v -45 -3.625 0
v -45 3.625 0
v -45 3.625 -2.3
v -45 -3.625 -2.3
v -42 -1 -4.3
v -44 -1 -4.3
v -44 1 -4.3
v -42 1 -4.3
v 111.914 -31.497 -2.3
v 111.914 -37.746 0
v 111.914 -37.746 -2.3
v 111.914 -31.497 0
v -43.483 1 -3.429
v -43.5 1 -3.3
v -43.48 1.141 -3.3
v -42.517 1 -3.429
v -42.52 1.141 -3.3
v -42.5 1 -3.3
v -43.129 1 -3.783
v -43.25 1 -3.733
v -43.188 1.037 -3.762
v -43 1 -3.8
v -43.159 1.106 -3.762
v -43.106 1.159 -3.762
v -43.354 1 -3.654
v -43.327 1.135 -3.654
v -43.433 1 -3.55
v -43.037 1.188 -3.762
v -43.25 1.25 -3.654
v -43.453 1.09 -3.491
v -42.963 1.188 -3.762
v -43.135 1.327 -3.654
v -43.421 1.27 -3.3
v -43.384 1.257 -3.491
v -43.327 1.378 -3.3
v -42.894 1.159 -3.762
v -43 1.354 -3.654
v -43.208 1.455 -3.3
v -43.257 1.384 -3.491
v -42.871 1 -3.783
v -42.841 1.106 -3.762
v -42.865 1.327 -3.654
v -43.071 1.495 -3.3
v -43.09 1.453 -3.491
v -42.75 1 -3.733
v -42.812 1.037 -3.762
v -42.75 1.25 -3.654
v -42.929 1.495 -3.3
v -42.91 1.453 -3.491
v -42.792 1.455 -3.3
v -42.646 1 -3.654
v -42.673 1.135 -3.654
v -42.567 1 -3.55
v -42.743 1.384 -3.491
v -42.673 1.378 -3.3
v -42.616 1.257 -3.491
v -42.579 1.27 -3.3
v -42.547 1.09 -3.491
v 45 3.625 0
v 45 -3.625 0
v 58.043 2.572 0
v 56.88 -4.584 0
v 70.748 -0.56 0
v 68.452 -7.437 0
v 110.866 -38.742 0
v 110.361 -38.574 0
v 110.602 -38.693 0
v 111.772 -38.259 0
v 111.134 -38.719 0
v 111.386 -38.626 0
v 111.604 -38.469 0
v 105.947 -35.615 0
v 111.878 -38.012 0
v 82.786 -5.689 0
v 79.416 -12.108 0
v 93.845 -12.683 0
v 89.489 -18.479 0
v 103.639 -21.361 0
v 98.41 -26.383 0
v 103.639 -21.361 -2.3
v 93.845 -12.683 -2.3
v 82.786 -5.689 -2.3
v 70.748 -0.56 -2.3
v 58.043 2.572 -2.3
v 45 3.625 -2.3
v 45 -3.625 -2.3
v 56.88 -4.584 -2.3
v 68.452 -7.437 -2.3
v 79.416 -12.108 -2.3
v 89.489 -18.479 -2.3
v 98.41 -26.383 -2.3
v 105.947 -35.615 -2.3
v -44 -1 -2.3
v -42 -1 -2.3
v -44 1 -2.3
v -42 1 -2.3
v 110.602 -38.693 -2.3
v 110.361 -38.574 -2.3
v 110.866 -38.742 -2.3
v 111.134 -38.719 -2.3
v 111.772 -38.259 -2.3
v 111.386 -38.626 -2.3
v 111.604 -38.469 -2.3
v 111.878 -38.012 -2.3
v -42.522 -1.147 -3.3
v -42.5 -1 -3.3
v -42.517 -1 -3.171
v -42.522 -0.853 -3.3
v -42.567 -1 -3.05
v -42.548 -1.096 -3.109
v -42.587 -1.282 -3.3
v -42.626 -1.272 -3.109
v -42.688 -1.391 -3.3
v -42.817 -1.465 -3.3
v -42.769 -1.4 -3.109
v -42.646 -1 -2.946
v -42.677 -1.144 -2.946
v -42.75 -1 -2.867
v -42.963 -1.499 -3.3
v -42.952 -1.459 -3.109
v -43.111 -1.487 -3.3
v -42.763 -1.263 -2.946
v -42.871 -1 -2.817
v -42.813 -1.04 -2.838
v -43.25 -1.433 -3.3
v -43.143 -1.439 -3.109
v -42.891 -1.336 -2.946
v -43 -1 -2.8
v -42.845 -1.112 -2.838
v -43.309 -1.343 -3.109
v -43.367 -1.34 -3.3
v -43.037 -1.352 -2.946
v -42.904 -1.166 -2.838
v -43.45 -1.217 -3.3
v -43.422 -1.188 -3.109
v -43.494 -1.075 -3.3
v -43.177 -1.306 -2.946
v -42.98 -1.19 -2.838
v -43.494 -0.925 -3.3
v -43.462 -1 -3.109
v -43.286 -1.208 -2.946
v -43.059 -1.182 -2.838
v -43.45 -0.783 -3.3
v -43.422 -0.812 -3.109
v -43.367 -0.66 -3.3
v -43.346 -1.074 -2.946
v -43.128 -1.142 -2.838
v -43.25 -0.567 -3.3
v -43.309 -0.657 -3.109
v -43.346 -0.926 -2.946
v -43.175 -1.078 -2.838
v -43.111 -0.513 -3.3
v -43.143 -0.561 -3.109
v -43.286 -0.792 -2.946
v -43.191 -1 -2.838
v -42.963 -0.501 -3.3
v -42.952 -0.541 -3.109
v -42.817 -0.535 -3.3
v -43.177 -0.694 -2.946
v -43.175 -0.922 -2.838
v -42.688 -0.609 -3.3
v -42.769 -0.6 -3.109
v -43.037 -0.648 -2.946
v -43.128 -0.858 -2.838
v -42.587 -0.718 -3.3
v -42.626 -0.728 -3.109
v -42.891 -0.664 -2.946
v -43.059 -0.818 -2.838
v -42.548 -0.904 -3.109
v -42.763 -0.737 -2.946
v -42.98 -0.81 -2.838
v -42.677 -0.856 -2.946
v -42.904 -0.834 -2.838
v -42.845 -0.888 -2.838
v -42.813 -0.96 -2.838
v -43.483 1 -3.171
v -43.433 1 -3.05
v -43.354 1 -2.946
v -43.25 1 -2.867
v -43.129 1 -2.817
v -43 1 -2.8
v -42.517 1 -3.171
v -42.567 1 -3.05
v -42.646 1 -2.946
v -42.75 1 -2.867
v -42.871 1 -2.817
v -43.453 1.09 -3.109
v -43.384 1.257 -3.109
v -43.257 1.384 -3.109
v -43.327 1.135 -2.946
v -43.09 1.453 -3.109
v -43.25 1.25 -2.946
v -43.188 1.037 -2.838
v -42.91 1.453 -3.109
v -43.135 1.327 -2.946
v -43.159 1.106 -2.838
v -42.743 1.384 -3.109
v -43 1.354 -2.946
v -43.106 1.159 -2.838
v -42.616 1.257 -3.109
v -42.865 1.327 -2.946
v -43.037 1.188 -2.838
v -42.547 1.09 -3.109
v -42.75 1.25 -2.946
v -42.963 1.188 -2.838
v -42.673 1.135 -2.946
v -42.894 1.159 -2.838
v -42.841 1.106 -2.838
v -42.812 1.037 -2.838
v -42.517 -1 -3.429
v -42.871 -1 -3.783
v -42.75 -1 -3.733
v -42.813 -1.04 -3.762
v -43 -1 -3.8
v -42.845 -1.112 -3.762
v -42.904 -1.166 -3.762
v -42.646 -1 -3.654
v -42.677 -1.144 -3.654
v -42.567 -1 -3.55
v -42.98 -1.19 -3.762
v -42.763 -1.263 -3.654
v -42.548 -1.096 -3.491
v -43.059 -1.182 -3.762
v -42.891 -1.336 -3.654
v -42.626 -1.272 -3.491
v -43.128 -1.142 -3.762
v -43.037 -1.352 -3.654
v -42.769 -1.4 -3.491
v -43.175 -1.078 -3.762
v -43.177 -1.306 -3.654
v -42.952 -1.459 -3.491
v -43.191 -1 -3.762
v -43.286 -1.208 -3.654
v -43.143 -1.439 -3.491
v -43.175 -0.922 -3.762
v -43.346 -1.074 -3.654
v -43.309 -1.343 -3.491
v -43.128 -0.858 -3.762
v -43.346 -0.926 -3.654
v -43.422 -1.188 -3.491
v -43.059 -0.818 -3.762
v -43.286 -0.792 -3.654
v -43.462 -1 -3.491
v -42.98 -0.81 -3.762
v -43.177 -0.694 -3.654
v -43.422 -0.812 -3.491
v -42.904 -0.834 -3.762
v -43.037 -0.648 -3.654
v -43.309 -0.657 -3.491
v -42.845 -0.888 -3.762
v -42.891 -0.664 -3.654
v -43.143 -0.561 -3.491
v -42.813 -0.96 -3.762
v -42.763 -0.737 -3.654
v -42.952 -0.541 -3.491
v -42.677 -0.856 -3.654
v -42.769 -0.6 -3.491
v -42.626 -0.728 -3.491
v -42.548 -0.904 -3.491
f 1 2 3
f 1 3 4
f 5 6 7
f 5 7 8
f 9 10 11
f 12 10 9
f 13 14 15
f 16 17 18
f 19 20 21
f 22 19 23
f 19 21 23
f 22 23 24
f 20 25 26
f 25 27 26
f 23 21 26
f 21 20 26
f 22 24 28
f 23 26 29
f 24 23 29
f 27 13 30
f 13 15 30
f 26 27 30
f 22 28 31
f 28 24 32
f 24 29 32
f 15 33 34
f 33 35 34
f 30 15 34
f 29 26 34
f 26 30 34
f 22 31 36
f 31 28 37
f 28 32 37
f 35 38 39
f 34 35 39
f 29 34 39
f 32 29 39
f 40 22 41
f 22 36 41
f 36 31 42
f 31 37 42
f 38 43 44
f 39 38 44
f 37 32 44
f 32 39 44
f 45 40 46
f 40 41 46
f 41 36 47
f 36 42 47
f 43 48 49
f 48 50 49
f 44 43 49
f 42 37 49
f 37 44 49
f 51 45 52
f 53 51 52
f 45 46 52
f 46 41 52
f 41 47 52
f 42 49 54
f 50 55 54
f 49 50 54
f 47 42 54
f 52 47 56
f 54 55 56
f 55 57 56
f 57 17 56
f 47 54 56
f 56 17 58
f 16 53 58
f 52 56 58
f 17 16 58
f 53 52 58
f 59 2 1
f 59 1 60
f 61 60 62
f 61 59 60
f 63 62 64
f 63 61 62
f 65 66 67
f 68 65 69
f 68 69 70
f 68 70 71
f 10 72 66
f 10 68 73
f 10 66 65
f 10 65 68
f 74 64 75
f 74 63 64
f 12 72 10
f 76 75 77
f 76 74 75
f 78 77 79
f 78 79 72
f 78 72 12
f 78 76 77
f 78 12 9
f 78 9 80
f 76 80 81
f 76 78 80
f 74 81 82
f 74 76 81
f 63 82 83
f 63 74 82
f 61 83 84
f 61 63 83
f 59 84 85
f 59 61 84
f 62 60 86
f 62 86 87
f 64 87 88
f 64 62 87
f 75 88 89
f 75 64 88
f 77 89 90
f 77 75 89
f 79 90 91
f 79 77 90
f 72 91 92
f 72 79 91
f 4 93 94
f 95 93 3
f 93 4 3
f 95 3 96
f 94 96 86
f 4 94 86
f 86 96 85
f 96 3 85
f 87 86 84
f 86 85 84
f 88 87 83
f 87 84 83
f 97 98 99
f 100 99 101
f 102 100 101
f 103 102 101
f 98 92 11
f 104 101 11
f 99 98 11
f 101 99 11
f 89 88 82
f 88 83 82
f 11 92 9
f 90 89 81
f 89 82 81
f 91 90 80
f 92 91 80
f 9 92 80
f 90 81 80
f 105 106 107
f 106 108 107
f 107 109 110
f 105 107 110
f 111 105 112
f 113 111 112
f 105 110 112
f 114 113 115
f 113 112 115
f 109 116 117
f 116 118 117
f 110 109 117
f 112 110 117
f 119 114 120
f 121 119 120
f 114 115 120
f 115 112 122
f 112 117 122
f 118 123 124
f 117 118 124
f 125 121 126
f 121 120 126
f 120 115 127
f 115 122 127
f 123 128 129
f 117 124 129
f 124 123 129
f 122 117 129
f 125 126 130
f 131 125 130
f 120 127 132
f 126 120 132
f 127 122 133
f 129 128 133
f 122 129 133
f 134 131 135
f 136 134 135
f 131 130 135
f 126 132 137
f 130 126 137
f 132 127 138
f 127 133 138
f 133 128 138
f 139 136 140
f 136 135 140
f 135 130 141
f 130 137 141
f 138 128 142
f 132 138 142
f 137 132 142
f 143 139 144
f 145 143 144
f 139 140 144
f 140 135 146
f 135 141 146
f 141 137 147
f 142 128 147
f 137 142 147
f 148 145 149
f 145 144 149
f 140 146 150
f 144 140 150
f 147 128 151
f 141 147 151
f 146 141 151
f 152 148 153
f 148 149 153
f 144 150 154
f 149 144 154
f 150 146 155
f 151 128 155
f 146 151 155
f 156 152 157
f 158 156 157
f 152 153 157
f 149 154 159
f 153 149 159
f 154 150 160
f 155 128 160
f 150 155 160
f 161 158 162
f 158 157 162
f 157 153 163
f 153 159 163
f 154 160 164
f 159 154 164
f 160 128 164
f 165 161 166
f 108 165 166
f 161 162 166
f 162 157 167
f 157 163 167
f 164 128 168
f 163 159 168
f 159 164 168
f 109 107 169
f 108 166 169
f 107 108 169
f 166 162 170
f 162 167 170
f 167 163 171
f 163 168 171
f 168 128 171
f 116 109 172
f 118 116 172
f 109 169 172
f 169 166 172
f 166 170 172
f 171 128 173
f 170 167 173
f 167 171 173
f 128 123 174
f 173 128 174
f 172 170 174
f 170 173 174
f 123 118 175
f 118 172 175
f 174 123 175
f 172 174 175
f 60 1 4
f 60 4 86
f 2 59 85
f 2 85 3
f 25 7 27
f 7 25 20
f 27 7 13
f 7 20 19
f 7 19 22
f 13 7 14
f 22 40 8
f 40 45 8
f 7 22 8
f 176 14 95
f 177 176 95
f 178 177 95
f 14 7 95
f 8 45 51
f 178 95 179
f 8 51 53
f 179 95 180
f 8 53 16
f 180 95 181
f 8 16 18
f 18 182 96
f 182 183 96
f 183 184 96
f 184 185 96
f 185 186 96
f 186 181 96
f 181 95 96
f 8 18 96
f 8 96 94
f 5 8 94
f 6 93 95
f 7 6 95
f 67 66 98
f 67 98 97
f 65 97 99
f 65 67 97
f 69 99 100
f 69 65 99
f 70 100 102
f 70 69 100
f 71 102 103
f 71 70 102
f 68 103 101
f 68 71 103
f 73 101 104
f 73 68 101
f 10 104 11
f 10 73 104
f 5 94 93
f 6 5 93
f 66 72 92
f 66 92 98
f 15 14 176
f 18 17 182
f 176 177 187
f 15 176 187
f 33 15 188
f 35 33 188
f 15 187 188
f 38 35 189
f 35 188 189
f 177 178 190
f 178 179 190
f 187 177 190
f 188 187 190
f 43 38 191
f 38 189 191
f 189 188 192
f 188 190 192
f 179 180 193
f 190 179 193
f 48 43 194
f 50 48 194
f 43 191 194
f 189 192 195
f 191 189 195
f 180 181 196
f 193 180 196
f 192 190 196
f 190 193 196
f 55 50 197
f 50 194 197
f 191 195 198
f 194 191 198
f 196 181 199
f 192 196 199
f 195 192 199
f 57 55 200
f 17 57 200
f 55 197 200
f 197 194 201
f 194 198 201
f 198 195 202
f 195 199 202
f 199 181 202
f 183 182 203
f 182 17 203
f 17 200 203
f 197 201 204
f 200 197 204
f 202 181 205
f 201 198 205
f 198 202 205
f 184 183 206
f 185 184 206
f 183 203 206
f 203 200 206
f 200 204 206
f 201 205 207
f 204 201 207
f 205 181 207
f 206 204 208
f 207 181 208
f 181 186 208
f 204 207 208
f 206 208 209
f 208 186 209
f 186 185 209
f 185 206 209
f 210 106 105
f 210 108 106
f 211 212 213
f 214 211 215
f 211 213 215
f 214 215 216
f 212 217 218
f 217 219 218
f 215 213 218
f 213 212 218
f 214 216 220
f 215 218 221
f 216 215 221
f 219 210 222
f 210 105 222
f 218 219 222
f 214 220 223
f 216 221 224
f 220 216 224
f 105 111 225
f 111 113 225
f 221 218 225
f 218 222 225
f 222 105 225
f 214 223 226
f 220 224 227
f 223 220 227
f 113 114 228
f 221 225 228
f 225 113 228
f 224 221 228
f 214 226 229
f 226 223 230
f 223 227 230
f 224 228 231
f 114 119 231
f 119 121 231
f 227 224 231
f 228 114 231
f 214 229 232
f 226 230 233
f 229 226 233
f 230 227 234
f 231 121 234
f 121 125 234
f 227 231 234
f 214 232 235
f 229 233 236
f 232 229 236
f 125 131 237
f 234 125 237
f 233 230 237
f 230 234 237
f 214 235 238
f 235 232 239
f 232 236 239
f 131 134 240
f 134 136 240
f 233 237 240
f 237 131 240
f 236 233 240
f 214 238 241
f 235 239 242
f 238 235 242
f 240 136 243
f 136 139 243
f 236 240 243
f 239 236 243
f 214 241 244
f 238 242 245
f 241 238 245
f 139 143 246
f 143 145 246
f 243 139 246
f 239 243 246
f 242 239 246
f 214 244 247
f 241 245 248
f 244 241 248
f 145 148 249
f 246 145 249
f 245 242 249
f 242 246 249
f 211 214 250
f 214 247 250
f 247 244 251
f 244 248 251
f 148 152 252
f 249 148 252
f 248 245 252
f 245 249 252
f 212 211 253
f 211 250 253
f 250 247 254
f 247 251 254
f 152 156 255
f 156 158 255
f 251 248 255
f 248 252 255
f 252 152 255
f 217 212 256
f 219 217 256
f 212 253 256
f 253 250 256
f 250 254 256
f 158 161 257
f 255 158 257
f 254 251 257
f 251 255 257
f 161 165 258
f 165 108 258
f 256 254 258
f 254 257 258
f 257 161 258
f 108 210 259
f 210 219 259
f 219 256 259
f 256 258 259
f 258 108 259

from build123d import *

# Parameters (mm, degrees)
F1_DEPTH = 2.3
F3_DEPTH = 2


with BuildPart() as f1:
    # F0 (on Top) → F1 (new body)
    with BuildSketch(Plane.XY):
        Polygon((45, 3.625), (-45, 3.625), (-45, 0), (-45, -3.625), (45, -3.625), align=None)
        Polygon((-44, -1), (-44, 0), (-44, 1), (-42, 1), (-42, -1), align=None, mode=Mode.SUBTRACT)
        with BuildLine():
            ThreePointArc((111.9139716029, -31.496938318), (82.7856789898, -5.6889854515), (45, 3.625))
            Line((45, 3.625), (45, -3.625))
            ThreePointArc((45, -3.625), (79.4162271285, -12.1084320129), (105.947070592, -35.615019464))
            Line((105.947070592, -35.615019464), (110.3610228539, -38.574432601))
            ThreePointArc((110.3610228539, -38.574432601), (111.3860089549, -38.6260052928), (111.9139716029, -37.7459418336))
            Line((111.9139716029, -37.7459418336), (111.9139716029, -31.496938318))
        make_face()
        Polygon((-44, 1), (-44, 0), (-44, -1), (-42, -1), (-42, 1), align=None)
    extrude(amount=-F1_DEPTH)

    # F2 (on face) → F3 (join)
    with BuildSketch(Plane(origin=(0, 0, -2.3), x_dir=(1, 0, 0), z_dir=(0, 0, -1))):
        Polygon((-44, 1), (-44, 0), (-44, -1), (-42, -1), (-42, 1), align=None)
    extrude(amount=F3_DEPTH)

    # F6 (on face) → F7 (revolve)
    with BuildSketch(Plane(origin=(0, 1, 0), x_dir=(-1, 0, 0), z_dir=(0, 1, 0))):
        with BuildLine():
            ThreePointArc((43.5, -3.3), (43.3535533906, -2.9464466094), (43, -2.8))
            Line((43, -2.8), (43, -3.3))
            Line((43, -3.3), (43.5, -3.3))
        make_face()
        with BuildLine():
            Line((43.5, -3.3), (43, -3.3))
            Line((43, -3.3), (43, -3.8))
            ThreePointArc((43, -3.8), (43.3535533906, -3.6535533906), (43.5, -3.3))
        make_face()
    revolve(axis=Axis((-43, 1, -3.3), (0, 0, -1)))


with BuildPart() as f5:
    # F4 (on face) → F5 (revolve)
    with BuildSketch(Plane.XZ.offset(1)):
        with BuildLine():
            Line((-43, -3.3), (-42.5, -3.3))
            ThreePointArc((-42.5, -3.3), (-42.6464466094, -2.9464466094), (-43, -2.8))
            Line((-43, -2.8), (-43, -3.3))
        make_face()
        with BuildLine():
            ThreePointArc((-43, -3.8), (-42.6464466094, -3.6535533906), (-42.5, -3.3))
            Line((-42.5, -3.3), (-43, -3.3))
            Line((-43, -3.3), (-43, -3.8))
        make_face()
    revolve(axis=Axis((-43, -1, -3.3), (0, 0, -1)))


solid = Compound([f1.part, f5.part])
